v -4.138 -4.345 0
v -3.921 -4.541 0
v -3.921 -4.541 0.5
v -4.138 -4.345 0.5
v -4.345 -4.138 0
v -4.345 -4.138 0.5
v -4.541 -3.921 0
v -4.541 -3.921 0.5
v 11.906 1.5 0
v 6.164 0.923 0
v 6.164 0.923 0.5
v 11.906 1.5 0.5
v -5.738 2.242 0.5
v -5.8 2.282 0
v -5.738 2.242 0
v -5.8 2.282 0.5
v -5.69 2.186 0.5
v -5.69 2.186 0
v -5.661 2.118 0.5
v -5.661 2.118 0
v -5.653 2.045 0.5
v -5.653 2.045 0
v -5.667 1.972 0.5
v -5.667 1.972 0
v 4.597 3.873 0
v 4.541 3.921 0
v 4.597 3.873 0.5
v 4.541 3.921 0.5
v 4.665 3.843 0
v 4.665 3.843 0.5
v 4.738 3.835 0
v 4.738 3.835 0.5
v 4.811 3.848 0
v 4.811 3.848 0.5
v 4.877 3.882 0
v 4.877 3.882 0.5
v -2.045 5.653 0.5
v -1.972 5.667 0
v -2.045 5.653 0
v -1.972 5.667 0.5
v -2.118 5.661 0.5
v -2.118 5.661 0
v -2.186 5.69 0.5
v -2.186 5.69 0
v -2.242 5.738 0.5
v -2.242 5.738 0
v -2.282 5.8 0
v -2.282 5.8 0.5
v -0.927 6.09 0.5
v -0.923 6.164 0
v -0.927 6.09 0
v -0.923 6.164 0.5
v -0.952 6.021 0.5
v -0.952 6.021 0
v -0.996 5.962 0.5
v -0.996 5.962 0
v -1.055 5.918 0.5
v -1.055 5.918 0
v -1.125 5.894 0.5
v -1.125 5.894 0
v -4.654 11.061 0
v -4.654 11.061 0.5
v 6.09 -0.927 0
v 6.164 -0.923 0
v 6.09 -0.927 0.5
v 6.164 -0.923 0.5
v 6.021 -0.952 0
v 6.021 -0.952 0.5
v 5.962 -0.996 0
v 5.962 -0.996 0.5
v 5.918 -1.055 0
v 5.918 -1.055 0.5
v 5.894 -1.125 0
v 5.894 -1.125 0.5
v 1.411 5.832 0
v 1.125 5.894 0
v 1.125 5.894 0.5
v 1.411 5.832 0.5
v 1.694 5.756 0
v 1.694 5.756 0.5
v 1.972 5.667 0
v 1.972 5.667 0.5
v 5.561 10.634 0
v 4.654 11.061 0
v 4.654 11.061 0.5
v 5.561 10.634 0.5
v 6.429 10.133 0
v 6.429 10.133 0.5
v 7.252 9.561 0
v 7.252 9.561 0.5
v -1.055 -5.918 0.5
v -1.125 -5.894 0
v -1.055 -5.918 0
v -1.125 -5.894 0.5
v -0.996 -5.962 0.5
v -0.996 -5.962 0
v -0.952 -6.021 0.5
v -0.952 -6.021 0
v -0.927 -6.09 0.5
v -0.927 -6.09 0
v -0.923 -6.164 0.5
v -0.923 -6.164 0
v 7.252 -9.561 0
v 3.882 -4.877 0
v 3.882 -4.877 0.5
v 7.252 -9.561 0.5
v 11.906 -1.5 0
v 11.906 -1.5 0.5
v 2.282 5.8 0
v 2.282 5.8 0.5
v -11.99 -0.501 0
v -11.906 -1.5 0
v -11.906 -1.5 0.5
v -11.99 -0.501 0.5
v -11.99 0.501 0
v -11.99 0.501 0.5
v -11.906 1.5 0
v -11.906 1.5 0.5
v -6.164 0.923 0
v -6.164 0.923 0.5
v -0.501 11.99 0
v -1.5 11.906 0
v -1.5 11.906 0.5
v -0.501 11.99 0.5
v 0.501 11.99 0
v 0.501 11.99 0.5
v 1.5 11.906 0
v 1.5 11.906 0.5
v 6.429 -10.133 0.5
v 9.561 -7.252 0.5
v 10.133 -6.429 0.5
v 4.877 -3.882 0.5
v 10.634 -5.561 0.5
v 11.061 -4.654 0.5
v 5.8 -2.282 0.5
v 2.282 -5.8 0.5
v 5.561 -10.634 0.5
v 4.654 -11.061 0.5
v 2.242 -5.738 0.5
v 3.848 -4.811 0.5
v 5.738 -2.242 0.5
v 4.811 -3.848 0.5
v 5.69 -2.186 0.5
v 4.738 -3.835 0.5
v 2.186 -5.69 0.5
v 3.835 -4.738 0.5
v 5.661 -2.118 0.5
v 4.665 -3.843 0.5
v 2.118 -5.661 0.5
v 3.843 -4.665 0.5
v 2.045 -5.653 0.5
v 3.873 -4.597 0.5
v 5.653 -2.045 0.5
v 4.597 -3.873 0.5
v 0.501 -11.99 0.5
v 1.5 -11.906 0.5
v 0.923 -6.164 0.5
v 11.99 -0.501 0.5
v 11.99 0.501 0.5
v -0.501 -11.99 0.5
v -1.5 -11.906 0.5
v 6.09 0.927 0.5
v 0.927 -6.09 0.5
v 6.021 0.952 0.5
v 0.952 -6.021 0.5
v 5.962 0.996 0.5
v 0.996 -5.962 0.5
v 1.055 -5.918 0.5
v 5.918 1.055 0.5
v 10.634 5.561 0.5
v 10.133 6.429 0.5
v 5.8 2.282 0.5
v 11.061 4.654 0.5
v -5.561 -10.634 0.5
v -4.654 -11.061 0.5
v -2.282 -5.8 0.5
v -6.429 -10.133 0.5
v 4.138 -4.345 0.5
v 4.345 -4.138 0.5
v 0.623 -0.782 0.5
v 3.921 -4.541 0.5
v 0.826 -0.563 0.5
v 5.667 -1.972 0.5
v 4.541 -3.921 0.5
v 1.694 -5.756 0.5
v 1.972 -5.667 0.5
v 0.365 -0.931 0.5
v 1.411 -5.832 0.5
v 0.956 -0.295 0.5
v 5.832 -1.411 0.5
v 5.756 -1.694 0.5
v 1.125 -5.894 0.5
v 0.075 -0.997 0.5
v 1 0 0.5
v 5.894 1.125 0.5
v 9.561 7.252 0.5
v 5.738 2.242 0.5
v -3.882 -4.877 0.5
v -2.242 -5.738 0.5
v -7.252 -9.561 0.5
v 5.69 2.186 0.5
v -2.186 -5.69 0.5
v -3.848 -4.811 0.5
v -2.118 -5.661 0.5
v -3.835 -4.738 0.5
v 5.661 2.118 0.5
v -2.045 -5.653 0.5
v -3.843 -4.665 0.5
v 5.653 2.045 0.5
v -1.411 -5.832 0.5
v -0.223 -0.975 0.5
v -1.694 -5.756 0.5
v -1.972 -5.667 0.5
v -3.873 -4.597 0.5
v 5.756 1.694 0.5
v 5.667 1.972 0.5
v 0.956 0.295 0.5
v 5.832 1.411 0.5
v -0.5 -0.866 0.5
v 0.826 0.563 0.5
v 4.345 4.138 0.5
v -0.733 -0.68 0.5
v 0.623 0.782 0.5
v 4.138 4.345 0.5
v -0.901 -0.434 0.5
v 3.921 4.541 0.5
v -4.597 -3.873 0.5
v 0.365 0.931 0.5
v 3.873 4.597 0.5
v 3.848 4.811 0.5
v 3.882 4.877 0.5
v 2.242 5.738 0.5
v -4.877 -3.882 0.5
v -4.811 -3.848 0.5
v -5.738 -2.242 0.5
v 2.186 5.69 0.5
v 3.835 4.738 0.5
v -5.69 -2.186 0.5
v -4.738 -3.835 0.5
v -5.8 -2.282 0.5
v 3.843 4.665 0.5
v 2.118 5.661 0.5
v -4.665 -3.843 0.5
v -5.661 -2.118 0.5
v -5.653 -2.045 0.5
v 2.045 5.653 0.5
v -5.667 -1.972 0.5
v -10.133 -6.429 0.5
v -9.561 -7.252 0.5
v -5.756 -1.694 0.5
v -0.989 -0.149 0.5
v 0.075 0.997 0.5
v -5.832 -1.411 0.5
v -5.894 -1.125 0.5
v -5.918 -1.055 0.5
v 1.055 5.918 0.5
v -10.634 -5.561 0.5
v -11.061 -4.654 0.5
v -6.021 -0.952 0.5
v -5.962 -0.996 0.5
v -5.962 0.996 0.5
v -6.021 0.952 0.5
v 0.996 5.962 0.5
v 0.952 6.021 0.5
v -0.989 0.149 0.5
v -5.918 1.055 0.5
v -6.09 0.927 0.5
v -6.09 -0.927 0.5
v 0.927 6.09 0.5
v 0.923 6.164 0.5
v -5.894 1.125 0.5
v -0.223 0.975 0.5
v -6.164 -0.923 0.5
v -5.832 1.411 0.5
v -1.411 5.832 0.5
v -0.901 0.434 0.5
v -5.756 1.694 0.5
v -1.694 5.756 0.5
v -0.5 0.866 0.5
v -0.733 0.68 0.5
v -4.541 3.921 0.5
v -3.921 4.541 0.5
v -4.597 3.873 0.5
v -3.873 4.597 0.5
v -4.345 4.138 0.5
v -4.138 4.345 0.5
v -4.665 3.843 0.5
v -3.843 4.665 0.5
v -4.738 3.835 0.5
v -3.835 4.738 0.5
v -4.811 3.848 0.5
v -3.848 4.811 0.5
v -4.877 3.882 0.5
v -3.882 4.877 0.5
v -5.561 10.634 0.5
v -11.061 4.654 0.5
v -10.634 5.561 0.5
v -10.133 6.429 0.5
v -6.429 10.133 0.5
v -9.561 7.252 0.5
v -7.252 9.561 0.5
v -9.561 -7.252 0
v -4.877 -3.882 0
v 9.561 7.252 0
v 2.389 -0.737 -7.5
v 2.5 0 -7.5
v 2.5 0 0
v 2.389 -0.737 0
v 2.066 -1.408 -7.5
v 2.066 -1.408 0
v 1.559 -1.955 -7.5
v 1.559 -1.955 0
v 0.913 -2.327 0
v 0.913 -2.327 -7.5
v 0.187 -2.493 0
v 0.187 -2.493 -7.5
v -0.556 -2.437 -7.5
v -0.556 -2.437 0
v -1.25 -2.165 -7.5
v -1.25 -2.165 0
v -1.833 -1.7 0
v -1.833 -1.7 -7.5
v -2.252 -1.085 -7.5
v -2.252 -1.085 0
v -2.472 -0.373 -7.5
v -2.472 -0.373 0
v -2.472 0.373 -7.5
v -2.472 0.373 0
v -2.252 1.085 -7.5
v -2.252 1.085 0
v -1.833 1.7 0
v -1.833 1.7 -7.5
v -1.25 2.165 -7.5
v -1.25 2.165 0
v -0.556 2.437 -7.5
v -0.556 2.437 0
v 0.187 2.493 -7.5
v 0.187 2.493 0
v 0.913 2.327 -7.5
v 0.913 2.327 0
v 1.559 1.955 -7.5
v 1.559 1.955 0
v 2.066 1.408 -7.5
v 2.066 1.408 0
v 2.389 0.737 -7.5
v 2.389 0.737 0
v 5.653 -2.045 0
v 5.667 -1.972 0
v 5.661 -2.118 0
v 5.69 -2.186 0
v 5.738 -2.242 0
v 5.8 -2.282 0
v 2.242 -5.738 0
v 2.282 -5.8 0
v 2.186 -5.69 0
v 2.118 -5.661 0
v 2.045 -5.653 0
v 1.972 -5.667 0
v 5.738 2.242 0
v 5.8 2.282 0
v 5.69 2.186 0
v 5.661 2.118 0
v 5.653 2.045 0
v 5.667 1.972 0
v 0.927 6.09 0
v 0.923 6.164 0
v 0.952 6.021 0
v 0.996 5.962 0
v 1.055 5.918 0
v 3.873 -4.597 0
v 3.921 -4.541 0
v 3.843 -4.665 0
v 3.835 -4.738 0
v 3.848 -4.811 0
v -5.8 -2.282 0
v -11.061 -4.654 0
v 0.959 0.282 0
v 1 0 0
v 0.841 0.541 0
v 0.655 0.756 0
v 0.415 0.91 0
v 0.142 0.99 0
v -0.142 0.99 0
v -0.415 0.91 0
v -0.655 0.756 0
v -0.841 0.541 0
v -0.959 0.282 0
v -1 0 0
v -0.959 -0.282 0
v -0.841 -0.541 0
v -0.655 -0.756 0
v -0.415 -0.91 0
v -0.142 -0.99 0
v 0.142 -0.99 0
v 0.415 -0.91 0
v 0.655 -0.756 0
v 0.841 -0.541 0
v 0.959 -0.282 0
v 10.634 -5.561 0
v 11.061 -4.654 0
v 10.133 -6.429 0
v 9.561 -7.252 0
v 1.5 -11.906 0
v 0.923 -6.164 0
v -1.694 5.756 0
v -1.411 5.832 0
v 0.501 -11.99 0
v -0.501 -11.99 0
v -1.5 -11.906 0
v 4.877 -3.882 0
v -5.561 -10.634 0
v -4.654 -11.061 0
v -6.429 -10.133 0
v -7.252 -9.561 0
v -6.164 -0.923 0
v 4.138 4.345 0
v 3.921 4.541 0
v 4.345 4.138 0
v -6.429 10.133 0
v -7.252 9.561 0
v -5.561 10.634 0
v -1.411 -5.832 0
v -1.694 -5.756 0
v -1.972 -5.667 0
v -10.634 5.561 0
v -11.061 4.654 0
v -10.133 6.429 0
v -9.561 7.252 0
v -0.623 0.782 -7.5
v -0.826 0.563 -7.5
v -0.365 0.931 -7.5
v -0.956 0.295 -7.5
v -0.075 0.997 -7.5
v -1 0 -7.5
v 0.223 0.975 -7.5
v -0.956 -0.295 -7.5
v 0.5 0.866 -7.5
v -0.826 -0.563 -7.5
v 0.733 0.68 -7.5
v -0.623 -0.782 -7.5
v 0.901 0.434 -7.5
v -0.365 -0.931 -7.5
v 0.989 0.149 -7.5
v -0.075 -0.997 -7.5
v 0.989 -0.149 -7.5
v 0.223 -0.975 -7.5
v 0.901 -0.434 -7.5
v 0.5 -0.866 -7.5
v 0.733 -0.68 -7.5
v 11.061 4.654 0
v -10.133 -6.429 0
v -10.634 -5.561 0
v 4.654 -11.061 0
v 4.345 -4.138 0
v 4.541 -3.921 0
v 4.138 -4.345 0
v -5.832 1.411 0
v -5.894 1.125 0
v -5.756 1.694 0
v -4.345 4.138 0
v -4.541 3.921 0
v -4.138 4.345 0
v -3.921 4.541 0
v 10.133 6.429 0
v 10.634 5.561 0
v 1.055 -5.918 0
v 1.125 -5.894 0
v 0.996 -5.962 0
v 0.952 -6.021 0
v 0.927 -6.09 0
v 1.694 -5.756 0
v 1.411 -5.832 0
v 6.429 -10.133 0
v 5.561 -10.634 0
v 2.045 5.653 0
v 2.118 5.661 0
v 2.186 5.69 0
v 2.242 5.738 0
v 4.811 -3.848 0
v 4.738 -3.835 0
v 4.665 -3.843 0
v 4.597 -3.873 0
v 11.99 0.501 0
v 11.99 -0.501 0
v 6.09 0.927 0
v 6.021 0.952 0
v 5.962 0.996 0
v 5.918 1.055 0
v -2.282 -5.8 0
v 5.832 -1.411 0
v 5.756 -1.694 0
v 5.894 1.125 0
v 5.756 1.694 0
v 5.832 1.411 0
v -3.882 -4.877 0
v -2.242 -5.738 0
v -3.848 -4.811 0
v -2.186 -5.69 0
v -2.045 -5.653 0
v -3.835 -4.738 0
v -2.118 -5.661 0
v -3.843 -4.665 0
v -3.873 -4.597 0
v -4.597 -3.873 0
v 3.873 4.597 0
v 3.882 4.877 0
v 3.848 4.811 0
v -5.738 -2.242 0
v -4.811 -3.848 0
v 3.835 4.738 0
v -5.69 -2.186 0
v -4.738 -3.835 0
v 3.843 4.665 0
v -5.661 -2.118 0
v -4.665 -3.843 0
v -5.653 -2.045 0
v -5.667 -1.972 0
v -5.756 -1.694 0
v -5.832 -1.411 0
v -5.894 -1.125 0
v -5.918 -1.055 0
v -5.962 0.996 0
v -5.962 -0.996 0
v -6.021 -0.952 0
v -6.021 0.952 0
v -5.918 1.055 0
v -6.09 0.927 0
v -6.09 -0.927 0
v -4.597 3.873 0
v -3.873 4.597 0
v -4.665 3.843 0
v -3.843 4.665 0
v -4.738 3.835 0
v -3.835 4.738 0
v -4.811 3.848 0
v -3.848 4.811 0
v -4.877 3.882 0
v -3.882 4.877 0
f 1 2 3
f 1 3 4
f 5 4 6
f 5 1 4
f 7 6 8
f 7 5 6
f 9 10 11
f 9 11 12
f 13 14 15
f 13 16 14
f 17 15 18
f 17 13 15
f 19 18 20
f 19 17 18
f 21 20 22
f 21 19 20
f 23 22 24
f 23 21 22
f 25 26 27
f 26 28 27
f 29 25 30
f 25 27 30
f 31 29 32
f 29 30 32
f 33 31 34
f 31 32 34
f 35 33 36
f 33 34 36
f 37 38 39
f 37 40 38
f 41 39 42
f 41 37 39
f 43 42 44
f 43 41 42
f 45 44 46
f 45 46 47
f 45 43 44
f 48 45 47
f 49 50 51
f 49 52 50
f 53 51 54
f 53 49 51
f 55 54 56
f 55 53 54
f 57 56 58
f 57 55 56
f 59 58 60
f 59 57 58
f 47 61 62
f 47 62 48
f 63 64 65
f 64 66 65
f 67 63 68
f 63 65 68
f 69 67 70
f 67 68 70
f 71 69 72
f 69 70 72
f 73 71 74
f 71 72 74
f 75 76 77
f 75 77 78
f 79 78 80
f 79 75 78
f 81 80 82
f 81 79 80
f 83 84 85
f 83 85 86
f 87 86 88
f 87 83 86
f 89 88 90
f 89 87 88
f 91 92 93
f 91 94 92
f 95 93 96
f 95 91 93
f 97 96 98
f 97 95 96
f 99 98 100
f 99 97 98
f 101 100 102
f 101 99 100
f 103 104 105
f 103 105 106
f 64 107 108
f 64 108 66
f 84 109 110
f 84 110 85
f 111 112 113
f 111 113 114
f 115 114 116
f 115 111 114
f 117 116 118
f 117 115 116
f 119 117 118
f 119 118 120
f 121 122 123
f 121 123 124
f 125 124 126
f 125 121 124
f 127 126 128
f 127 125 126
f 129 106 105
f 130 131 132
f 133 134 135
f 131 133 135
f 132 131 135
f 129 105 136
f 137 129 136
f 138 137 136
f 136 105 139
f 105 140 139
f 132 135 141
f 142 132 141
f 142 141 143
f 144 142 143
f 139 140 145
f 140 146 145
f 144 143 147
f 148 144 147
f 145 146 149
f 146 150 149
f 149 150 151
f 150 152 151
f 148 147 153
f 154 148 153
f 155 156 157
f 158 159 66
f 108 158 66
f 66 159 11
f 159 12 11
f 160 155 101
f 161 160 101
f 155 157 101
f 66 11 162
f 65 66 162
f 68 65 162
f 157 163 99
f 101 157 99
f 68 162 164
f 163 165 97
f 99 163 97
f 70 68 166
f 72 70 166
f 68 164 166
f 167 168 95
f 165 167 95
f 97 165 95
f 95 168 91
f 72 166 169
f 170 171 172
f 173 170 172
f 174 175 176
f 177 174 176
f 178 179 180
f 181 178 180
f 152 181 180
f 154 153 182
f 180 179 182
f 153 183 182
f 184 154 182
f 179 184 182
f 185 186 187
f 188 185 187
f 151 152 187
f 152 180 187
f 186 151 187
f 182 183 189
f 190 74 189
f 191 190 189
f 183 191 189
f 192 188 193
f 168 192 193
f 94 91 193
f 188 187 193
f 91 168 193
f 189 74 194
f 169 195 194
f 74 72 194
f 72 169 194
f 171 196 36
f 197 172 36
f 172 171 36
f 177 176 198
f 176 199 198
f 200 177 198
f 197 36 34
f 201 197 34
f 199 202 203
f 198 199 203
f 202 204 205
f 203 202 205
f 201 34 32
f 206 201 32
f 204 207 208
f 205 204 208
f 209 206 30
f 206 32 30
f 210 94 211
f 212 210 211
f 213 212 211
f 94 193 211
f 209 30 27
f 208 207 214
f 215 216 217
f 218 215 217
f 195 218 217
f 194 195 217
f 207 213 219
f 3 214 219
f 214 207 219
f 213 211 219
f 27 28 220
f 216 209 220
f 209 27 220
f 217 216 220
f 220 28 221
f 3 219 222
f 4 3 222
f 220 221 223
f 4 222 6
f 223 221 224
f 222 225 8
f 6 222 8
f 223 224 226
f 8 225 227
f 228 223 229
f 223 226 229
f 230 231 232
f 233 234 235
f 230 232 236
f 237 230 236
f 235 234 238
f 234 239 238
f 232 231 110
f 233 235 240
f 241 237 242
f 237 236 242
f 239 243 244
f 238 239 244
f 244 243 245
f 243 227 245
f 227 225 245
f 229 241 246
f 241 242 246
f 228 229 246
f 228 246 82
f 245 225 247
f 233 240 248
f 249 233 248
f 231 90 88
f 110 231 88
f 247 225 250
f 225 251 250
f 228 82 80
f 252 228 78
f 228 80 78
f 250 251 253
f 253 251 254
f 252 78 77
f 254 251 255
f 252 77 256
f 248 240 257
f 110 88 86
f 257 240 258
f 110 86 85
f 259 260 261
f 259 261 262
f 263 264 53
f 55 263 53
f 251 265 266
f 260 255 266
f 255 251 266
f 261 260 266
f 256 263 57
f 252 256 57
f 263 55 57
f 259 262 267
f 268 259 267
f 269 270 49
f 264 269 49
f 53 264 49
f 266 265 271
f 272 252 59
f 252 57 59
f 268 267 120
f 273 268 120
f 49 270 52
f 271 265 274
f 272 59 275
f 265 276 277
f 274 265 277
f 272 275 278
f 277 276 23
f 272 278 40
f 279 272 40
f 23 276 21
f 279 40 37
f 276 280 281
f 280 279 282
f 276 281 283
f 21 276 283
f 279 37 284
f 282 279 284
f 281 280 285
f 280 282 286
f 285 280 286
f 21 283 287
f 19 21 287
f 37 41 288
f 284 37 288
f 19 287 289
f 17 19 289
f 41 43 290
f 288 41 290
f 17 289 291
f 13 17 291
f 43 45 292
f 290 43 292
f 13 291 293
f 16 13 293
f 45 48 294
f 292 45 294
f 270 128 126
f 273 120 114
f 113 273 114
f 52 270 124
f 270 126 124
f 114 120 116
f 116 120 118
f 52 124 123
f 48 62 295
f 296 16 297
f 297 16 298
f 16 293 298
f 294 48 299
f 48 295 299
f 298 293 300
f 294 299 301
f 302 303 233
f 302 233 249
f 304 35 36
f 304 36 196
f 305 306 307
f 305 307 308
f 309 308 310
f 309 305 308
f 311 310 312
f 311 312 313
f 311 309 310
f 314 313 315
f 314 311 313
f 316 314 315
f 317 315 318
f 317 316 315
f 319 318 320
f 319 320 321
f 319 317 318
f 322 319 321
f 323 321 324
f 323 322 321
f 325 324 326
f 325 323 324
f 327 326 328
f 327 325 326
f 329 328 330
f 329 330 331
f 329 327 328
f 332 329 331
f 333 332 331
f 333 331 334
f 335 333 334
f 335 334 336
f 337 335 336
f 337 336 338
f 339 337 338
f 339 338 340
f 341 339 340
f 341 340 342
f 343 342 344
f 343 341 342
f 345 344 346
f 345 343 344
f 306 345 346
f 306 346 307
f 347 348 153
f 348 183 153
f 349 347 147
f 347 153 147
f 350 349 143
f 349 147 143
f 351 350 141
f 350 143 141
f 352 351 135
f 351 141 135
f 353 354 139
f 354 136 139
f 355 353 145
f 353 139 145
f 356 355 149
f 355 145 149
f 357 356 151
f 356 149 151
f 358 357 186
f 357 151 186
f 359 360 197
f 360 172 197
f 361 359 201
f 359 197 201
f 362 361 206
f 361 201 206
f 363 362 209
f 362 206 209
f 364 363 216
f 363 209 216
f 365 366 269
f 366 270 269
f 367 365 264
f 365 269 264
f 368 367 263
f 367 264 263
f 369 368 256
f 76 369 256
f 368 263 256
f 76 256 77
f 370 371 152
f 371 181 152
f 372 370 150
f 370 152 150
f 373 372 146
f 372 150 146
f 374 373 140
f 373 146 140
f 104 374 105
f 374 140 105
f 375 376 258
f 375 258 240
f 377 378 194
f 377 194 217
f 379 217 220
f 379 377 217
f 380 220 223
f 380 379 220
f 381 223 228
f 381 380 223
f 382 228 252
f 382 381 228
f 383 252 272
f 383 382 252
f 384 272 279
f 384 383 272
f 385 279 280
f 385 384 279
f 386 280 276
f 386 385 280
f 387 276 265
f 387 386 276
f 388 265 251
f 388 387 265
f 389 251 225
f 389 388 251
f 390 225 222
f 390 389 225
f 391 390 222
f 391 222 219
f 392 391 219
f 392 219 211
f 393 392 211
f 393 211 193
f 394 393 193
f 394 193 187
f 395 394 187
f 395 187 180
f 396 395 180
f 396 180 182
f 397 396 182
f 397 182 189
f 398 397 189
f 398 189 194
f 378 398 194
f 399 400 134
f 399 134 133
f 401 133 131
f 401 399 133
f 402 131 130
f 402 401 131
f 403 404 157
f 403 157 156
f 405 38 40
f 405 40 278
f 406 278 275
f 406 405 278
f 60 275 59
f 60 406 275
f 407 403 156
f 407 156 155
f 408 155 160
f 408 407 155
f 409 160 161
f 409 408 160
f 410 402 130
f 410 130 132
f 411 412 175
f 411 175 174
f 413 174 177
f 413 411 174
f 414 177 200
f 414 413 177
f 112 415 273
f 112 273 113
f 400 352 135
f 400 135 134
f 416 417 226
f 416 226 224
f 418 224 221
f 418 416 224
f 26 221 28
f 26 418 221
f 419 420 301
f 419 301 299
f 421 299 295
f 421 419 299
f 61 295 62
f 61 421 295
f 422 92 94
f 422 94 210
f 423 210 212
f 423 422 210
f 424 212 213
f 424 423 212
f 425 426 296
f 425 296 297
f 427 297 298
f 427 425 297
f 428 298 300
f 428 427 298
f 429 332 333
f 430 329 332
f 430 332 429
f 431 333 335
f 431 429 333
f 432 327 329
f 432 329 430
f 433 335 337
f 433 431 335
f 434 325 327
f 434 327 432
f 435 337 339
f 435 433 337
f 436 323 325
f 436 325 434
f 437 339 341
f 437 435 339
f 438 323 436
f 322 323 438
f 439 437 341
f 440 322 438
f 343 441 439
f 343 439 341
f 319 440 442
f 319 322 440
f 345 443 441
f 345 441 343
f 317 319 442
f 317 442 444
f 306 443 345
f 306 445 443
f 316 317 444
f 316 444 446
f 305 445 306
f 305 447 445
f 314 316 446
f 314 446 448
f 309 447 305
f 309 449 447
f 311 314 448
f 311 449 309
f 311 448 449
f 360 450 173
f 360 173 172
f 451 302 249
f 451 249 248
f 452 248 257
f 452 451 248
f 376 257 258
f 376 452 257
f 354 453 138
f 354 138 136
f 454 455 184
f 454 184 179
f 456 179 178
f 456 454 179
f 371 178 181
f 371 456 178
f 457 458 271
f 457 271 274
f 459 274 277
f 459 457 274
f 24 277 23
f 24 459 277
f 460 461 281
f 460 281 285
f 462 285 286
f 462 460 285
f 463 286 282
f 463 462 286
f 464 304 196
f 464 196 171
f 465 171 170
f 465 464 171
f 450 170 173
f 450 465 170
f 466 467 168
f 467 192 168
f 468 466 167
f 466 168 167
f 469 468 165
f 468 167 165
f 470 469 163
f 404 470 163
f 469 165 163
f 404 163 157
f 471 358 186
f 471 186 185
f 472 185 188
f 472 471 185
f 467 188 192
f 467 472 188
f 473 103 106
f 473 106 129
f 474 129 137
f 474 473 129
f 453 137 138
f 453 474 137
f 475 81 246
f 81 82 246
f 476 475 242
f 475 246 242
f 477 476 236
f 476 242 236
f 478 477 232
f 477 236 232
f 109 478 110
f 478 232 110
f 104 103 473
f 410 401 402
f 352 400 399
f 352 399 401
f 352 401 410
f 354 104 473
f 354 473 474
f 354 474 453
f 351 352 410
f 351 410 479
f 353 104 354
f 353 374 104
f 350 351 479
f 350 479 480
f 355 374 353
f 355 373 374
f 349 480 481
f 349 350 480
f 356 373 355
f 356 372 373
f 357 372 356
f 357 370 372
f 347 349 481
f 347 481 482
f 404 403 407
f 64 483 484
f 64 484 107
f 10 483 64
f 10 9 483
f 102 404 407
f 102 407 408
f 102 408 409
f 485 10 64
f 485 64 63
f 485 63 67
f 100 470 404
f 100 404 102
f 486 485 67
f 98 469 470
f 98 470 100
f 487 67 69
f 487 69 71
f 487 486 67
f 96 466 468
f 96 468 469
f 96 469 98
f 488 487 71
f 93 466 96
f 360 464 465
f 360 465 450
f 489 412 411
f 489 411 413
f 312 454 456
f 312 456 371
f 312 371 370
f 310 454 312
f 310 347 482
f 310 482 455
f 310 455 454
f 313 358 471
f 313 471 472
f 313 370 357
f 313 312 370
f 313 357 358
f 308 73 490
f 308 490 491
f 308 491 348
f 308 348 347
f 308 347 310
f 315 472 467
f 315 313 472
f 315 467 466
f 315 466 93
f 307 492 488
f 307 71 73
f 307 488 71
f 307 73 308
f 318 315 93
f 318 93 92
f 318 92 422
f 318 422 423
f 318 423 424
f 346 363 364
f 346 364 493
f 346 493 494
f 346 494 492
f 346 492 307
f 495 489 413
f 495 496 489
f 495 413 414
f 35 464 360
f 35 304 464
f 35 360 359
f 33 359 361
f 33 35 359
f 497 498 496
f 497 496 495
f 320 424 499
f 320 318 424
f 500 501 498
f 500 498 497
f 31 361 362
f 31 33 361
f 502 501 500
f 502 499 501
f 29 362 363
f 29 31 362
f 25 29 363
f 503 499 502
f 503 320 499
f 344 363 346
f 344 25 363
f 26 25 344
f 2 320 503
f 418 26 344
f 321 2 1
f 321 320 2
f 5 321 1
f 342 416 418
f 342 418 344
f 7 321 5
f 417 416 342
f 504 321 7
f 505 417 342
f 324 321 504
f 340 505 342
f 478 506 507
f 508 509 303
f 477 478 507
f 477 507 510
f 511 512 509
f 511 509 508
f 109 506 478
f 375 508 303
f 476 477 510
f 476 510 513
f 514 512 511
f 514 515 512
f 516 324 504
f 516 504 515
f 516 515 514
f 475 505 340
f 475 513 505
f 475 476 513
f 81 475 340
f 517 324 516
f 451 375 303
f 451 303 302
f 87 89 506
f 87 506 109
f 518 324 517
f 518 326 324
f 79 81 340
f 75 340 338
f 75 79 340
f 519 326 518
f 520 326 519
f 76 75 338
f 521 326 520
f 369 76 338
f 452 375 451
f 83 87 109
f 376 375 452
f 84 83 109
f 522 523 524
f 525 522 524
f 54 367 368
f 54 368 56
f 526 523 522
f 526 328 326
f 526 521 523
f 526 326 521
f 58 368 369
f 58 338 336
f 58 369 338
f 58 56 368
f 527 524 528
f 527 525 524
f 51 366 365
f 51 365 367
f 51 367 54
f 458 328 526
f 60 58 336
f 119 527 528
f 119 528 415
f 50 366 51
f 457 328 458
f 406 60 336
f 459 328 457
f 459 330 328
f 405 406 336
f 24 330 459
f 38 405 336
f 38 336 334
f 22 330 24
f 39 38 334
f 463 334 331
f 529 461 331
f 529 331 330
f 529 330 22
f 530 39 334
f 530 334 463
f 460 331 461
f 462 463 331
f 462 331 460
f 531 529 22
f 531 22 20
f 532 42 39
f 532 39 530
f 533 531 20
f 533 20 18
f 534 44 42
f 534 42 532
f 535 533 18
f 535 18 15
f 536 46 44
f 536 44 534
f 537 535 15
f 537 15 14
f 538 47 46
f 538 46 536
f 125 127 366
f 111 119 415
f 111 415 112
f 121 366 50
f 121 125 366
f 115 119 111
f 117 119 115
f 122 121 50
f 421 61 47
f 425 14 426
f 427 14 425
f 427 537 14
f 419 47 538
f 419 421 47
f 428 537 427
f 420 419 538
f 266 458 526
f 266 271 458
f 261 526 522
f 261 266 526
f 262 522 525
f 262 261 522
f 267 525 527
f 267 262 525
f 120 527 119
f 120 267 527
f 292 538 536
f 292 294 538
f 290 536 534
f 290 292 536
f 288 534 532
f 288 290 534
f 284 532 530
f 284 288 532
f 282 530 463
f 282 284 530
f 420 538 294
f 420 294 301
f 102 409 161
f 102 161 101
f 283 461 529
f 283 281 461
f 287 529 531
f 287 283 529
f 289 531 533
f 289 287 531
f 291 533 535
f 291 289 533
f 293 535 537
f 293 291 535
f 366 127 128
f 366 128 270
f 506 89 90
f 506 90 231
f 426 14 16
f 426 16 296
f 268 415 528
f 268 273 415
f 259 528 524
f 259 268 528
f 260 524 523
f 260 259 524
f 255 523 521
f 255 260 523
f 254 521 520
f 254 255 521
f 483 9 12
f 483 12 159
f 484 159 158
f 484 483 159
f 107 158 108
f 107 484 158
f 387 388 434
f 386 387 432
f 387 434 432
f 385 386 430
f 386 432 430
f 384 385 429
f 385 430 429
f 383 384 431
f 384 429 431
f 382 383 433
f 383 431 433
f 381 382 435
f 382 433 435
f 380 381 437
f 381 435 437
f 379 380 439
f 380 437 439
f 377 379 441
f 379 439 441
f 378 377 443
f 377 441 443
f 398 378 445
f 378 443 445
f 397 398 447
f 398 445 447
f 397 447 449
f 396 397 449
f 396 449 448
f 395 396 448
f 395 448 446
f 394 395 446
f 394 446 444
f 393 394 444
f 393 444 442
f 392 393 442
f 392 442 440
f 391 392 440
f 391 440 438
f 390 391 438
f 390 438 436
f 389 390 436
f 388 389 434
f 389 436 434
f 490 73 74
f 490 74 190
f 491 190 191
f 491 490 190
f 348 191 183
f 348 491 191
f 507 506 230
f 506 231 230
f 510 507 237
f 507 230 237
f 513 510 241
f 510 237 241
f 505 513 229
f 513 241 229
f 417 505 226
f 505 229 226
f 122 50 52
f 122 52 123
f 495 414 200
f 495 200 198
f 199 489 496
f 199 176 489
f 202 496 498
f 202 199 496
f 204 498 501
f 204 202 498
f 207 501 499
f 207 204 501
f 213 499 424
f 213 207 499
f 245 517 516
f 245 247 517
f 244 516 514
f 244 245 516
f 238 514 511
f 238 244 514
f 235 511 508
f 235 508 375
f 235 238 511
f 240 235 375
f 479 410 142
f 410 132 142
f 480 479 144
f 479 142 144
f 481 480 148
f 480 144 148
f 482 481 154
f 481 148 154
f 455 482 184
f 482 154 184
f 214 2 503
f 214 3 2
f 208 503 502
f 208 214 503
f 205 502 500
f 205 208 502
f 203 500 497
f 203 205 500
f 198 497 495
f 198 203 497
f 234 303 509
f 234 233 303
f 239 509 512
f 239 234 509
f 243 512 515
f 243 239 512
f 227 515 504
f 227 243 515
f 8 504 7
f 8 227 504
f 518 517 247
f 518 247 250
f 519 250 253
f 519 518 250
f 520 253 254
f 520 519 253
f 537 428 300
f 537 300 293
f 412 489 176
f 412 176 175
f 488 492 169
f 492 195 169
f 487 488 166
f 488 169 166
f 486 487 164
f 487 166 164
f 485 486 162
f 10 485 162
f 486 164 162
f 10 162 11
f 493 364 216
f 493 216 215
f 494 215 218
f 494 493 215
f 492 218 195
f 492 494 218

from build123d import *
from build123d.topology import SkipClean

# Parameters (mm, degrees)
CROQUIS1_R              = 1
SALIENTE_EXTRUIR2_DEPTH = 0.5
REDONDEO1_R             = 0.25
SALIENTE_EXTRUIR3_START = 7.5
CROQUIS2_R              = 2.5
CROQUIS2_R_2            = 1
SALIENTE_EXTRUIR3_DEPTH = 7.5


with BuildPart() as part:
    # Croquis1 → Saliente-Extruir2 (new body)
    with BuildSketch(Plane.XY):
        with BuildLine():
            Line((-0.9, 5.93211598), (-1.5, 11.9058809))
            ThreePointArc((-1.5, 11.9058809), (0, 12), (1.5, 11.9058809))
            Line((1.5, 11.9058809), (0.9, 5.93211598))
            ThreePointArc((0.9, 5.93211598), (1.552914271, 5.795554958), (2.186635127, 5.587363137))
            Line((2.186635127, 5.587363137), (4.653902344, 11.060795314))
            ThreePointArc((4.653902344, 11.060795314), (6, 10.392304845), (7.251978556, 9.560795314))
            Line((7.251978556, 9.560795314), (3.745480853, 4.687363137))
            ThreePointArc((3.745480853, 4.687363137), (4.242640687, 4.242640687), (4.687363137, 3.745480853))
            Line((4.687363137, 3.745480853), (9.560795314, 7.251978556))
            ThreePointArc((9.560795314, 7.251978556), (10.392304845, 6), (11.060795314, 4.653902344))
            Line((11.060795314, 4.653902344), (5.587363137, 2.186635127))
            ThreePointArc((5.587363137, 2.186635127), (5.795554958, 1.552914271), (5.93211598, 0.9))
            Line((5.93211598, 0.9), (11.9058809, 1.5))
            ThreePointArc((11.9058809, 1.5), (12, 0), (11.9058809, -1.5))
            Line((11.9058809, -1.5), (5.93211598, -0.9))
            ThreePointArc((5.93211598, -0.9), (5.795554958, -1.552914271), (5.587363137, -2.186635127))
            Line((5.587363137, -2.186635127), (11.060795314, -4.653902344))
            ThreePointArc((11.060795314, -4.653902344), (10.392304845, -6), (9.560795314, -7.251978556))
            Line((9.560795314, -7.251978556), (4.687363137, -3.745480853))
            ThreePointArc((4.687363137, -3.745480853), (4.242640687, -4.242640687), (3.745480853, -4.687363137))
            Line((3.745480853, -4.687363137), (7.251978556, -9.560795314))
            ThreePointArc((7.251978556, -9.560795314), (6, -10.392304845), (4.653902344, -11.060795314))
            Line((4.653902344, -11.060795314), (2.186635127, -5.587363137))
            ThreePointArc((2.186635127, -5.587363137), (1.552914271, -5.795554958), (0.9, -5.93211598))
            Line((0.9, -5.93211598), (1.5, -11.9058809))
            ThreePointArc((1.5, -11.9058809), (0, -12), (-1.5, -11.9058809))
            Line((-1.5, -11.9058809), (-0.9, -5.93211598))
            ThreePointArc((-0.9, -5.93211598), (-1.552914271, -5.795554958), (-2.186635127, -5.587363137))
            Line((-2.186635127, -5.587363137), (-4.653902344, -11.060795314))
            ThreePointArc((-4.653902344, -11.060795314), (-6, -10.392304845), (-7.251978556, -9.560795314))
            Line((-7.251978556, -9.560795314), (-3.745480853, -4.687363137))
            ThreePointArc((-3.745480853, -4.687363137), (-4.242640687, -4.242640687), (-4.687363137, -3.745480853))
            Line((-4.687363137, -3.745480853), (-9.560795314, -7.251978556))
            ThreePointArc((-9.560795314, -7.251978556), (-10.392304845, -6), (-11.060795314, -4.653902344))
            Line((-11.060795314, -4.653902344), (-5.587363137, -2.186635127))
            ThreePointArc((-5.587363137, -2.186635127), (-5.795554958, -1.552914271), (-5.93211598, -0.9))
            Line((-5.93211598, -0.9), (-11.9058809, -1.5))
            ThreePointArc((-11.9058809, -1.5), (-12, 0), (-11.9058809, 1.5))
            Line((-11.9058809, 1.5), (-5.93211598, 0.9))
            ThreePointArc((-5.93211598, 0.9), (-5.795554958, 1.552914271), (-5.587363137, 2.186635127))
            Line((-5.587363137, 2.186635127), (-11.060795314, 4.653902344))
            ThreePointArc((-11.060795314, 4.653902344), (-10.392304845, 6), (-9.560795314, 7.251978556))
            Line((-9.560795314, 7.251978556), (-4.687363137, 3.745480853))
            ThreePointArc((-4.687363137, 3.745480853), (-4.242640687, 4.242640687), (-3.745480853, 4.687363137))
            Line((-3.745480853, 4.687363137), (-7.251978556, 9.560795314))
            ThreePointArc((-7.251978556, 9.560795314), (-6, 10.392304845), (-4.653902344, 11.060795314))
            Line((-4.653902344, 11.060795314), (-2.186635127, 5.587363137))
            ThreePointArc((-2.186635127, 5.587363137), (-1.552914271, 5.795554958), (-0.9, 5.93211598))
        make_face()
        Circle(CROQUIS1_R, mode=Mode.SUBTRACT)
    extrude(amount=SALIENTE_EXTRUIR2_DEPTH)

    # Redondeo1
    redondeo1_edges = [part.edges().sort_by_distance(p)[0] for p in [
        (-0.9, 5.93211598, 0.25),
        (0.9, 5.93211598, 0.25),
        (2.186635127, 5.587363137, 0.25),
        (3.745480853, 4.687363137, 0.25),
        (4.687363137, 3.745480853, 0.25),
        (5.587363137, 2.186635127, 0.25),
        (5.93211598, 0.9, 0.25),
        (5.93211598, -0.9, 0.25),
        (5.587363137, -2.186635127, 0.25),
        (4.687363137, -3.745480853, 0.25),
        (3.745480853, -4.687363137, 0.25),
        (2.186635127, -5.587363137, 0.25),
        (0.9, -5.93211598, 0.25),
        (-0.9, -5.93211598, 0.25),
        (-2.186635127, -5.587363137, 0.25),
        (-3.745480853, -4.687363137, 0.25),
        (-4.687363137, -3.745480853, 0.25),
        (-5.587363137, -2.186635127, 0.25),
        (-5.93211598, -0.9, 0.25),
        (-5.93211598, 0.9, 0.25),
        (-5.587363137, 2.186635127, 0.25),
        (-4.687363137, 3.745480853, 0.25),
        (-3.745480853, 4.687363137, 0.25),
        (-2.186635127, 5.587363137, 0.25),
    ]]
    fillet(redondeo1_edges, radius=REDONDEO1_R)

    # Croquis2 → Saliente-Extruir3 (add)
    with SkipClean():  # the faces are left unmerged after this step: merging them gives an invalid solid
        with BuildSketch(Plane(origin=(0, 0, 0), x_dir=(-1, 0, 0), z_dir=(0, 0, -1)).offset(SALIENTE_EXTRUIR3_START)):
            with Locations(Location((0, 0, 0), (0, 0, 180))):
                Circle(CROQUIS2_R)
            Circle(CROQUIS2_R_2, mode=Mode.SUBTRACT)
        extrude(amount=-SALIENTE_EXTRUIR3_DEPTH)


solid = part.part
